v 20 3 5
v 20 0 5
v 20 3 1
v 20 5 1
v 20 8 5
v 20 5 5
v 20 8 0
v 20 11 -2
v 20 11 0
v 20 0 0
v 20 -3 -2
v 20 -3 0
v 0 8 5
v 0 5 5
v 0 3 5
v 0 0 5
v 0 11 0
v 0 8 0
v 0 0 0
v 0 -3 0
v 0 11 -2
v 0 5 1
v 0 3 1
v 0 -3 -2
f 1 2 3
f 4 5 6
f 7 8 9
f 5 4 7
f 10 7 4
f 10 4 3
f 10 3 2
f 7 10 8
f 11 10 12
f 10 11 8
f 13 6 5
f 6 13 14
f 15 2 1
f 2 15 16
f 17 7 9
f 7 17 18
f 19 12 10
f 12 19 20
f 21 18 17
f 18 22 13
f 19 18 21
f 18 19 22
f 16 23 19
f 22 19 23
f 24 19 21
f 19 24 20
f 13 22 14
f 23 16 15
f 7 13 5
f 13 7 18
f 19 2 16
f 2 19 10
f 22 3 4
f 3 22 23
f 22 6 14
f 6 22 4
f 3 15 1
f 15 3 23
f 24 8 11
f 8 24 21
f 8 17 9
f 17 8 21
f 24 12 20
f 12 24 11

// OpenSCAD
difference()
{
	translate([0,0,0]) cube([20,8,5]);
	translate([-1,3,1]) cube([22,2,5]);
}
translate([0,-3,-2]) cube([20,14,2]);
